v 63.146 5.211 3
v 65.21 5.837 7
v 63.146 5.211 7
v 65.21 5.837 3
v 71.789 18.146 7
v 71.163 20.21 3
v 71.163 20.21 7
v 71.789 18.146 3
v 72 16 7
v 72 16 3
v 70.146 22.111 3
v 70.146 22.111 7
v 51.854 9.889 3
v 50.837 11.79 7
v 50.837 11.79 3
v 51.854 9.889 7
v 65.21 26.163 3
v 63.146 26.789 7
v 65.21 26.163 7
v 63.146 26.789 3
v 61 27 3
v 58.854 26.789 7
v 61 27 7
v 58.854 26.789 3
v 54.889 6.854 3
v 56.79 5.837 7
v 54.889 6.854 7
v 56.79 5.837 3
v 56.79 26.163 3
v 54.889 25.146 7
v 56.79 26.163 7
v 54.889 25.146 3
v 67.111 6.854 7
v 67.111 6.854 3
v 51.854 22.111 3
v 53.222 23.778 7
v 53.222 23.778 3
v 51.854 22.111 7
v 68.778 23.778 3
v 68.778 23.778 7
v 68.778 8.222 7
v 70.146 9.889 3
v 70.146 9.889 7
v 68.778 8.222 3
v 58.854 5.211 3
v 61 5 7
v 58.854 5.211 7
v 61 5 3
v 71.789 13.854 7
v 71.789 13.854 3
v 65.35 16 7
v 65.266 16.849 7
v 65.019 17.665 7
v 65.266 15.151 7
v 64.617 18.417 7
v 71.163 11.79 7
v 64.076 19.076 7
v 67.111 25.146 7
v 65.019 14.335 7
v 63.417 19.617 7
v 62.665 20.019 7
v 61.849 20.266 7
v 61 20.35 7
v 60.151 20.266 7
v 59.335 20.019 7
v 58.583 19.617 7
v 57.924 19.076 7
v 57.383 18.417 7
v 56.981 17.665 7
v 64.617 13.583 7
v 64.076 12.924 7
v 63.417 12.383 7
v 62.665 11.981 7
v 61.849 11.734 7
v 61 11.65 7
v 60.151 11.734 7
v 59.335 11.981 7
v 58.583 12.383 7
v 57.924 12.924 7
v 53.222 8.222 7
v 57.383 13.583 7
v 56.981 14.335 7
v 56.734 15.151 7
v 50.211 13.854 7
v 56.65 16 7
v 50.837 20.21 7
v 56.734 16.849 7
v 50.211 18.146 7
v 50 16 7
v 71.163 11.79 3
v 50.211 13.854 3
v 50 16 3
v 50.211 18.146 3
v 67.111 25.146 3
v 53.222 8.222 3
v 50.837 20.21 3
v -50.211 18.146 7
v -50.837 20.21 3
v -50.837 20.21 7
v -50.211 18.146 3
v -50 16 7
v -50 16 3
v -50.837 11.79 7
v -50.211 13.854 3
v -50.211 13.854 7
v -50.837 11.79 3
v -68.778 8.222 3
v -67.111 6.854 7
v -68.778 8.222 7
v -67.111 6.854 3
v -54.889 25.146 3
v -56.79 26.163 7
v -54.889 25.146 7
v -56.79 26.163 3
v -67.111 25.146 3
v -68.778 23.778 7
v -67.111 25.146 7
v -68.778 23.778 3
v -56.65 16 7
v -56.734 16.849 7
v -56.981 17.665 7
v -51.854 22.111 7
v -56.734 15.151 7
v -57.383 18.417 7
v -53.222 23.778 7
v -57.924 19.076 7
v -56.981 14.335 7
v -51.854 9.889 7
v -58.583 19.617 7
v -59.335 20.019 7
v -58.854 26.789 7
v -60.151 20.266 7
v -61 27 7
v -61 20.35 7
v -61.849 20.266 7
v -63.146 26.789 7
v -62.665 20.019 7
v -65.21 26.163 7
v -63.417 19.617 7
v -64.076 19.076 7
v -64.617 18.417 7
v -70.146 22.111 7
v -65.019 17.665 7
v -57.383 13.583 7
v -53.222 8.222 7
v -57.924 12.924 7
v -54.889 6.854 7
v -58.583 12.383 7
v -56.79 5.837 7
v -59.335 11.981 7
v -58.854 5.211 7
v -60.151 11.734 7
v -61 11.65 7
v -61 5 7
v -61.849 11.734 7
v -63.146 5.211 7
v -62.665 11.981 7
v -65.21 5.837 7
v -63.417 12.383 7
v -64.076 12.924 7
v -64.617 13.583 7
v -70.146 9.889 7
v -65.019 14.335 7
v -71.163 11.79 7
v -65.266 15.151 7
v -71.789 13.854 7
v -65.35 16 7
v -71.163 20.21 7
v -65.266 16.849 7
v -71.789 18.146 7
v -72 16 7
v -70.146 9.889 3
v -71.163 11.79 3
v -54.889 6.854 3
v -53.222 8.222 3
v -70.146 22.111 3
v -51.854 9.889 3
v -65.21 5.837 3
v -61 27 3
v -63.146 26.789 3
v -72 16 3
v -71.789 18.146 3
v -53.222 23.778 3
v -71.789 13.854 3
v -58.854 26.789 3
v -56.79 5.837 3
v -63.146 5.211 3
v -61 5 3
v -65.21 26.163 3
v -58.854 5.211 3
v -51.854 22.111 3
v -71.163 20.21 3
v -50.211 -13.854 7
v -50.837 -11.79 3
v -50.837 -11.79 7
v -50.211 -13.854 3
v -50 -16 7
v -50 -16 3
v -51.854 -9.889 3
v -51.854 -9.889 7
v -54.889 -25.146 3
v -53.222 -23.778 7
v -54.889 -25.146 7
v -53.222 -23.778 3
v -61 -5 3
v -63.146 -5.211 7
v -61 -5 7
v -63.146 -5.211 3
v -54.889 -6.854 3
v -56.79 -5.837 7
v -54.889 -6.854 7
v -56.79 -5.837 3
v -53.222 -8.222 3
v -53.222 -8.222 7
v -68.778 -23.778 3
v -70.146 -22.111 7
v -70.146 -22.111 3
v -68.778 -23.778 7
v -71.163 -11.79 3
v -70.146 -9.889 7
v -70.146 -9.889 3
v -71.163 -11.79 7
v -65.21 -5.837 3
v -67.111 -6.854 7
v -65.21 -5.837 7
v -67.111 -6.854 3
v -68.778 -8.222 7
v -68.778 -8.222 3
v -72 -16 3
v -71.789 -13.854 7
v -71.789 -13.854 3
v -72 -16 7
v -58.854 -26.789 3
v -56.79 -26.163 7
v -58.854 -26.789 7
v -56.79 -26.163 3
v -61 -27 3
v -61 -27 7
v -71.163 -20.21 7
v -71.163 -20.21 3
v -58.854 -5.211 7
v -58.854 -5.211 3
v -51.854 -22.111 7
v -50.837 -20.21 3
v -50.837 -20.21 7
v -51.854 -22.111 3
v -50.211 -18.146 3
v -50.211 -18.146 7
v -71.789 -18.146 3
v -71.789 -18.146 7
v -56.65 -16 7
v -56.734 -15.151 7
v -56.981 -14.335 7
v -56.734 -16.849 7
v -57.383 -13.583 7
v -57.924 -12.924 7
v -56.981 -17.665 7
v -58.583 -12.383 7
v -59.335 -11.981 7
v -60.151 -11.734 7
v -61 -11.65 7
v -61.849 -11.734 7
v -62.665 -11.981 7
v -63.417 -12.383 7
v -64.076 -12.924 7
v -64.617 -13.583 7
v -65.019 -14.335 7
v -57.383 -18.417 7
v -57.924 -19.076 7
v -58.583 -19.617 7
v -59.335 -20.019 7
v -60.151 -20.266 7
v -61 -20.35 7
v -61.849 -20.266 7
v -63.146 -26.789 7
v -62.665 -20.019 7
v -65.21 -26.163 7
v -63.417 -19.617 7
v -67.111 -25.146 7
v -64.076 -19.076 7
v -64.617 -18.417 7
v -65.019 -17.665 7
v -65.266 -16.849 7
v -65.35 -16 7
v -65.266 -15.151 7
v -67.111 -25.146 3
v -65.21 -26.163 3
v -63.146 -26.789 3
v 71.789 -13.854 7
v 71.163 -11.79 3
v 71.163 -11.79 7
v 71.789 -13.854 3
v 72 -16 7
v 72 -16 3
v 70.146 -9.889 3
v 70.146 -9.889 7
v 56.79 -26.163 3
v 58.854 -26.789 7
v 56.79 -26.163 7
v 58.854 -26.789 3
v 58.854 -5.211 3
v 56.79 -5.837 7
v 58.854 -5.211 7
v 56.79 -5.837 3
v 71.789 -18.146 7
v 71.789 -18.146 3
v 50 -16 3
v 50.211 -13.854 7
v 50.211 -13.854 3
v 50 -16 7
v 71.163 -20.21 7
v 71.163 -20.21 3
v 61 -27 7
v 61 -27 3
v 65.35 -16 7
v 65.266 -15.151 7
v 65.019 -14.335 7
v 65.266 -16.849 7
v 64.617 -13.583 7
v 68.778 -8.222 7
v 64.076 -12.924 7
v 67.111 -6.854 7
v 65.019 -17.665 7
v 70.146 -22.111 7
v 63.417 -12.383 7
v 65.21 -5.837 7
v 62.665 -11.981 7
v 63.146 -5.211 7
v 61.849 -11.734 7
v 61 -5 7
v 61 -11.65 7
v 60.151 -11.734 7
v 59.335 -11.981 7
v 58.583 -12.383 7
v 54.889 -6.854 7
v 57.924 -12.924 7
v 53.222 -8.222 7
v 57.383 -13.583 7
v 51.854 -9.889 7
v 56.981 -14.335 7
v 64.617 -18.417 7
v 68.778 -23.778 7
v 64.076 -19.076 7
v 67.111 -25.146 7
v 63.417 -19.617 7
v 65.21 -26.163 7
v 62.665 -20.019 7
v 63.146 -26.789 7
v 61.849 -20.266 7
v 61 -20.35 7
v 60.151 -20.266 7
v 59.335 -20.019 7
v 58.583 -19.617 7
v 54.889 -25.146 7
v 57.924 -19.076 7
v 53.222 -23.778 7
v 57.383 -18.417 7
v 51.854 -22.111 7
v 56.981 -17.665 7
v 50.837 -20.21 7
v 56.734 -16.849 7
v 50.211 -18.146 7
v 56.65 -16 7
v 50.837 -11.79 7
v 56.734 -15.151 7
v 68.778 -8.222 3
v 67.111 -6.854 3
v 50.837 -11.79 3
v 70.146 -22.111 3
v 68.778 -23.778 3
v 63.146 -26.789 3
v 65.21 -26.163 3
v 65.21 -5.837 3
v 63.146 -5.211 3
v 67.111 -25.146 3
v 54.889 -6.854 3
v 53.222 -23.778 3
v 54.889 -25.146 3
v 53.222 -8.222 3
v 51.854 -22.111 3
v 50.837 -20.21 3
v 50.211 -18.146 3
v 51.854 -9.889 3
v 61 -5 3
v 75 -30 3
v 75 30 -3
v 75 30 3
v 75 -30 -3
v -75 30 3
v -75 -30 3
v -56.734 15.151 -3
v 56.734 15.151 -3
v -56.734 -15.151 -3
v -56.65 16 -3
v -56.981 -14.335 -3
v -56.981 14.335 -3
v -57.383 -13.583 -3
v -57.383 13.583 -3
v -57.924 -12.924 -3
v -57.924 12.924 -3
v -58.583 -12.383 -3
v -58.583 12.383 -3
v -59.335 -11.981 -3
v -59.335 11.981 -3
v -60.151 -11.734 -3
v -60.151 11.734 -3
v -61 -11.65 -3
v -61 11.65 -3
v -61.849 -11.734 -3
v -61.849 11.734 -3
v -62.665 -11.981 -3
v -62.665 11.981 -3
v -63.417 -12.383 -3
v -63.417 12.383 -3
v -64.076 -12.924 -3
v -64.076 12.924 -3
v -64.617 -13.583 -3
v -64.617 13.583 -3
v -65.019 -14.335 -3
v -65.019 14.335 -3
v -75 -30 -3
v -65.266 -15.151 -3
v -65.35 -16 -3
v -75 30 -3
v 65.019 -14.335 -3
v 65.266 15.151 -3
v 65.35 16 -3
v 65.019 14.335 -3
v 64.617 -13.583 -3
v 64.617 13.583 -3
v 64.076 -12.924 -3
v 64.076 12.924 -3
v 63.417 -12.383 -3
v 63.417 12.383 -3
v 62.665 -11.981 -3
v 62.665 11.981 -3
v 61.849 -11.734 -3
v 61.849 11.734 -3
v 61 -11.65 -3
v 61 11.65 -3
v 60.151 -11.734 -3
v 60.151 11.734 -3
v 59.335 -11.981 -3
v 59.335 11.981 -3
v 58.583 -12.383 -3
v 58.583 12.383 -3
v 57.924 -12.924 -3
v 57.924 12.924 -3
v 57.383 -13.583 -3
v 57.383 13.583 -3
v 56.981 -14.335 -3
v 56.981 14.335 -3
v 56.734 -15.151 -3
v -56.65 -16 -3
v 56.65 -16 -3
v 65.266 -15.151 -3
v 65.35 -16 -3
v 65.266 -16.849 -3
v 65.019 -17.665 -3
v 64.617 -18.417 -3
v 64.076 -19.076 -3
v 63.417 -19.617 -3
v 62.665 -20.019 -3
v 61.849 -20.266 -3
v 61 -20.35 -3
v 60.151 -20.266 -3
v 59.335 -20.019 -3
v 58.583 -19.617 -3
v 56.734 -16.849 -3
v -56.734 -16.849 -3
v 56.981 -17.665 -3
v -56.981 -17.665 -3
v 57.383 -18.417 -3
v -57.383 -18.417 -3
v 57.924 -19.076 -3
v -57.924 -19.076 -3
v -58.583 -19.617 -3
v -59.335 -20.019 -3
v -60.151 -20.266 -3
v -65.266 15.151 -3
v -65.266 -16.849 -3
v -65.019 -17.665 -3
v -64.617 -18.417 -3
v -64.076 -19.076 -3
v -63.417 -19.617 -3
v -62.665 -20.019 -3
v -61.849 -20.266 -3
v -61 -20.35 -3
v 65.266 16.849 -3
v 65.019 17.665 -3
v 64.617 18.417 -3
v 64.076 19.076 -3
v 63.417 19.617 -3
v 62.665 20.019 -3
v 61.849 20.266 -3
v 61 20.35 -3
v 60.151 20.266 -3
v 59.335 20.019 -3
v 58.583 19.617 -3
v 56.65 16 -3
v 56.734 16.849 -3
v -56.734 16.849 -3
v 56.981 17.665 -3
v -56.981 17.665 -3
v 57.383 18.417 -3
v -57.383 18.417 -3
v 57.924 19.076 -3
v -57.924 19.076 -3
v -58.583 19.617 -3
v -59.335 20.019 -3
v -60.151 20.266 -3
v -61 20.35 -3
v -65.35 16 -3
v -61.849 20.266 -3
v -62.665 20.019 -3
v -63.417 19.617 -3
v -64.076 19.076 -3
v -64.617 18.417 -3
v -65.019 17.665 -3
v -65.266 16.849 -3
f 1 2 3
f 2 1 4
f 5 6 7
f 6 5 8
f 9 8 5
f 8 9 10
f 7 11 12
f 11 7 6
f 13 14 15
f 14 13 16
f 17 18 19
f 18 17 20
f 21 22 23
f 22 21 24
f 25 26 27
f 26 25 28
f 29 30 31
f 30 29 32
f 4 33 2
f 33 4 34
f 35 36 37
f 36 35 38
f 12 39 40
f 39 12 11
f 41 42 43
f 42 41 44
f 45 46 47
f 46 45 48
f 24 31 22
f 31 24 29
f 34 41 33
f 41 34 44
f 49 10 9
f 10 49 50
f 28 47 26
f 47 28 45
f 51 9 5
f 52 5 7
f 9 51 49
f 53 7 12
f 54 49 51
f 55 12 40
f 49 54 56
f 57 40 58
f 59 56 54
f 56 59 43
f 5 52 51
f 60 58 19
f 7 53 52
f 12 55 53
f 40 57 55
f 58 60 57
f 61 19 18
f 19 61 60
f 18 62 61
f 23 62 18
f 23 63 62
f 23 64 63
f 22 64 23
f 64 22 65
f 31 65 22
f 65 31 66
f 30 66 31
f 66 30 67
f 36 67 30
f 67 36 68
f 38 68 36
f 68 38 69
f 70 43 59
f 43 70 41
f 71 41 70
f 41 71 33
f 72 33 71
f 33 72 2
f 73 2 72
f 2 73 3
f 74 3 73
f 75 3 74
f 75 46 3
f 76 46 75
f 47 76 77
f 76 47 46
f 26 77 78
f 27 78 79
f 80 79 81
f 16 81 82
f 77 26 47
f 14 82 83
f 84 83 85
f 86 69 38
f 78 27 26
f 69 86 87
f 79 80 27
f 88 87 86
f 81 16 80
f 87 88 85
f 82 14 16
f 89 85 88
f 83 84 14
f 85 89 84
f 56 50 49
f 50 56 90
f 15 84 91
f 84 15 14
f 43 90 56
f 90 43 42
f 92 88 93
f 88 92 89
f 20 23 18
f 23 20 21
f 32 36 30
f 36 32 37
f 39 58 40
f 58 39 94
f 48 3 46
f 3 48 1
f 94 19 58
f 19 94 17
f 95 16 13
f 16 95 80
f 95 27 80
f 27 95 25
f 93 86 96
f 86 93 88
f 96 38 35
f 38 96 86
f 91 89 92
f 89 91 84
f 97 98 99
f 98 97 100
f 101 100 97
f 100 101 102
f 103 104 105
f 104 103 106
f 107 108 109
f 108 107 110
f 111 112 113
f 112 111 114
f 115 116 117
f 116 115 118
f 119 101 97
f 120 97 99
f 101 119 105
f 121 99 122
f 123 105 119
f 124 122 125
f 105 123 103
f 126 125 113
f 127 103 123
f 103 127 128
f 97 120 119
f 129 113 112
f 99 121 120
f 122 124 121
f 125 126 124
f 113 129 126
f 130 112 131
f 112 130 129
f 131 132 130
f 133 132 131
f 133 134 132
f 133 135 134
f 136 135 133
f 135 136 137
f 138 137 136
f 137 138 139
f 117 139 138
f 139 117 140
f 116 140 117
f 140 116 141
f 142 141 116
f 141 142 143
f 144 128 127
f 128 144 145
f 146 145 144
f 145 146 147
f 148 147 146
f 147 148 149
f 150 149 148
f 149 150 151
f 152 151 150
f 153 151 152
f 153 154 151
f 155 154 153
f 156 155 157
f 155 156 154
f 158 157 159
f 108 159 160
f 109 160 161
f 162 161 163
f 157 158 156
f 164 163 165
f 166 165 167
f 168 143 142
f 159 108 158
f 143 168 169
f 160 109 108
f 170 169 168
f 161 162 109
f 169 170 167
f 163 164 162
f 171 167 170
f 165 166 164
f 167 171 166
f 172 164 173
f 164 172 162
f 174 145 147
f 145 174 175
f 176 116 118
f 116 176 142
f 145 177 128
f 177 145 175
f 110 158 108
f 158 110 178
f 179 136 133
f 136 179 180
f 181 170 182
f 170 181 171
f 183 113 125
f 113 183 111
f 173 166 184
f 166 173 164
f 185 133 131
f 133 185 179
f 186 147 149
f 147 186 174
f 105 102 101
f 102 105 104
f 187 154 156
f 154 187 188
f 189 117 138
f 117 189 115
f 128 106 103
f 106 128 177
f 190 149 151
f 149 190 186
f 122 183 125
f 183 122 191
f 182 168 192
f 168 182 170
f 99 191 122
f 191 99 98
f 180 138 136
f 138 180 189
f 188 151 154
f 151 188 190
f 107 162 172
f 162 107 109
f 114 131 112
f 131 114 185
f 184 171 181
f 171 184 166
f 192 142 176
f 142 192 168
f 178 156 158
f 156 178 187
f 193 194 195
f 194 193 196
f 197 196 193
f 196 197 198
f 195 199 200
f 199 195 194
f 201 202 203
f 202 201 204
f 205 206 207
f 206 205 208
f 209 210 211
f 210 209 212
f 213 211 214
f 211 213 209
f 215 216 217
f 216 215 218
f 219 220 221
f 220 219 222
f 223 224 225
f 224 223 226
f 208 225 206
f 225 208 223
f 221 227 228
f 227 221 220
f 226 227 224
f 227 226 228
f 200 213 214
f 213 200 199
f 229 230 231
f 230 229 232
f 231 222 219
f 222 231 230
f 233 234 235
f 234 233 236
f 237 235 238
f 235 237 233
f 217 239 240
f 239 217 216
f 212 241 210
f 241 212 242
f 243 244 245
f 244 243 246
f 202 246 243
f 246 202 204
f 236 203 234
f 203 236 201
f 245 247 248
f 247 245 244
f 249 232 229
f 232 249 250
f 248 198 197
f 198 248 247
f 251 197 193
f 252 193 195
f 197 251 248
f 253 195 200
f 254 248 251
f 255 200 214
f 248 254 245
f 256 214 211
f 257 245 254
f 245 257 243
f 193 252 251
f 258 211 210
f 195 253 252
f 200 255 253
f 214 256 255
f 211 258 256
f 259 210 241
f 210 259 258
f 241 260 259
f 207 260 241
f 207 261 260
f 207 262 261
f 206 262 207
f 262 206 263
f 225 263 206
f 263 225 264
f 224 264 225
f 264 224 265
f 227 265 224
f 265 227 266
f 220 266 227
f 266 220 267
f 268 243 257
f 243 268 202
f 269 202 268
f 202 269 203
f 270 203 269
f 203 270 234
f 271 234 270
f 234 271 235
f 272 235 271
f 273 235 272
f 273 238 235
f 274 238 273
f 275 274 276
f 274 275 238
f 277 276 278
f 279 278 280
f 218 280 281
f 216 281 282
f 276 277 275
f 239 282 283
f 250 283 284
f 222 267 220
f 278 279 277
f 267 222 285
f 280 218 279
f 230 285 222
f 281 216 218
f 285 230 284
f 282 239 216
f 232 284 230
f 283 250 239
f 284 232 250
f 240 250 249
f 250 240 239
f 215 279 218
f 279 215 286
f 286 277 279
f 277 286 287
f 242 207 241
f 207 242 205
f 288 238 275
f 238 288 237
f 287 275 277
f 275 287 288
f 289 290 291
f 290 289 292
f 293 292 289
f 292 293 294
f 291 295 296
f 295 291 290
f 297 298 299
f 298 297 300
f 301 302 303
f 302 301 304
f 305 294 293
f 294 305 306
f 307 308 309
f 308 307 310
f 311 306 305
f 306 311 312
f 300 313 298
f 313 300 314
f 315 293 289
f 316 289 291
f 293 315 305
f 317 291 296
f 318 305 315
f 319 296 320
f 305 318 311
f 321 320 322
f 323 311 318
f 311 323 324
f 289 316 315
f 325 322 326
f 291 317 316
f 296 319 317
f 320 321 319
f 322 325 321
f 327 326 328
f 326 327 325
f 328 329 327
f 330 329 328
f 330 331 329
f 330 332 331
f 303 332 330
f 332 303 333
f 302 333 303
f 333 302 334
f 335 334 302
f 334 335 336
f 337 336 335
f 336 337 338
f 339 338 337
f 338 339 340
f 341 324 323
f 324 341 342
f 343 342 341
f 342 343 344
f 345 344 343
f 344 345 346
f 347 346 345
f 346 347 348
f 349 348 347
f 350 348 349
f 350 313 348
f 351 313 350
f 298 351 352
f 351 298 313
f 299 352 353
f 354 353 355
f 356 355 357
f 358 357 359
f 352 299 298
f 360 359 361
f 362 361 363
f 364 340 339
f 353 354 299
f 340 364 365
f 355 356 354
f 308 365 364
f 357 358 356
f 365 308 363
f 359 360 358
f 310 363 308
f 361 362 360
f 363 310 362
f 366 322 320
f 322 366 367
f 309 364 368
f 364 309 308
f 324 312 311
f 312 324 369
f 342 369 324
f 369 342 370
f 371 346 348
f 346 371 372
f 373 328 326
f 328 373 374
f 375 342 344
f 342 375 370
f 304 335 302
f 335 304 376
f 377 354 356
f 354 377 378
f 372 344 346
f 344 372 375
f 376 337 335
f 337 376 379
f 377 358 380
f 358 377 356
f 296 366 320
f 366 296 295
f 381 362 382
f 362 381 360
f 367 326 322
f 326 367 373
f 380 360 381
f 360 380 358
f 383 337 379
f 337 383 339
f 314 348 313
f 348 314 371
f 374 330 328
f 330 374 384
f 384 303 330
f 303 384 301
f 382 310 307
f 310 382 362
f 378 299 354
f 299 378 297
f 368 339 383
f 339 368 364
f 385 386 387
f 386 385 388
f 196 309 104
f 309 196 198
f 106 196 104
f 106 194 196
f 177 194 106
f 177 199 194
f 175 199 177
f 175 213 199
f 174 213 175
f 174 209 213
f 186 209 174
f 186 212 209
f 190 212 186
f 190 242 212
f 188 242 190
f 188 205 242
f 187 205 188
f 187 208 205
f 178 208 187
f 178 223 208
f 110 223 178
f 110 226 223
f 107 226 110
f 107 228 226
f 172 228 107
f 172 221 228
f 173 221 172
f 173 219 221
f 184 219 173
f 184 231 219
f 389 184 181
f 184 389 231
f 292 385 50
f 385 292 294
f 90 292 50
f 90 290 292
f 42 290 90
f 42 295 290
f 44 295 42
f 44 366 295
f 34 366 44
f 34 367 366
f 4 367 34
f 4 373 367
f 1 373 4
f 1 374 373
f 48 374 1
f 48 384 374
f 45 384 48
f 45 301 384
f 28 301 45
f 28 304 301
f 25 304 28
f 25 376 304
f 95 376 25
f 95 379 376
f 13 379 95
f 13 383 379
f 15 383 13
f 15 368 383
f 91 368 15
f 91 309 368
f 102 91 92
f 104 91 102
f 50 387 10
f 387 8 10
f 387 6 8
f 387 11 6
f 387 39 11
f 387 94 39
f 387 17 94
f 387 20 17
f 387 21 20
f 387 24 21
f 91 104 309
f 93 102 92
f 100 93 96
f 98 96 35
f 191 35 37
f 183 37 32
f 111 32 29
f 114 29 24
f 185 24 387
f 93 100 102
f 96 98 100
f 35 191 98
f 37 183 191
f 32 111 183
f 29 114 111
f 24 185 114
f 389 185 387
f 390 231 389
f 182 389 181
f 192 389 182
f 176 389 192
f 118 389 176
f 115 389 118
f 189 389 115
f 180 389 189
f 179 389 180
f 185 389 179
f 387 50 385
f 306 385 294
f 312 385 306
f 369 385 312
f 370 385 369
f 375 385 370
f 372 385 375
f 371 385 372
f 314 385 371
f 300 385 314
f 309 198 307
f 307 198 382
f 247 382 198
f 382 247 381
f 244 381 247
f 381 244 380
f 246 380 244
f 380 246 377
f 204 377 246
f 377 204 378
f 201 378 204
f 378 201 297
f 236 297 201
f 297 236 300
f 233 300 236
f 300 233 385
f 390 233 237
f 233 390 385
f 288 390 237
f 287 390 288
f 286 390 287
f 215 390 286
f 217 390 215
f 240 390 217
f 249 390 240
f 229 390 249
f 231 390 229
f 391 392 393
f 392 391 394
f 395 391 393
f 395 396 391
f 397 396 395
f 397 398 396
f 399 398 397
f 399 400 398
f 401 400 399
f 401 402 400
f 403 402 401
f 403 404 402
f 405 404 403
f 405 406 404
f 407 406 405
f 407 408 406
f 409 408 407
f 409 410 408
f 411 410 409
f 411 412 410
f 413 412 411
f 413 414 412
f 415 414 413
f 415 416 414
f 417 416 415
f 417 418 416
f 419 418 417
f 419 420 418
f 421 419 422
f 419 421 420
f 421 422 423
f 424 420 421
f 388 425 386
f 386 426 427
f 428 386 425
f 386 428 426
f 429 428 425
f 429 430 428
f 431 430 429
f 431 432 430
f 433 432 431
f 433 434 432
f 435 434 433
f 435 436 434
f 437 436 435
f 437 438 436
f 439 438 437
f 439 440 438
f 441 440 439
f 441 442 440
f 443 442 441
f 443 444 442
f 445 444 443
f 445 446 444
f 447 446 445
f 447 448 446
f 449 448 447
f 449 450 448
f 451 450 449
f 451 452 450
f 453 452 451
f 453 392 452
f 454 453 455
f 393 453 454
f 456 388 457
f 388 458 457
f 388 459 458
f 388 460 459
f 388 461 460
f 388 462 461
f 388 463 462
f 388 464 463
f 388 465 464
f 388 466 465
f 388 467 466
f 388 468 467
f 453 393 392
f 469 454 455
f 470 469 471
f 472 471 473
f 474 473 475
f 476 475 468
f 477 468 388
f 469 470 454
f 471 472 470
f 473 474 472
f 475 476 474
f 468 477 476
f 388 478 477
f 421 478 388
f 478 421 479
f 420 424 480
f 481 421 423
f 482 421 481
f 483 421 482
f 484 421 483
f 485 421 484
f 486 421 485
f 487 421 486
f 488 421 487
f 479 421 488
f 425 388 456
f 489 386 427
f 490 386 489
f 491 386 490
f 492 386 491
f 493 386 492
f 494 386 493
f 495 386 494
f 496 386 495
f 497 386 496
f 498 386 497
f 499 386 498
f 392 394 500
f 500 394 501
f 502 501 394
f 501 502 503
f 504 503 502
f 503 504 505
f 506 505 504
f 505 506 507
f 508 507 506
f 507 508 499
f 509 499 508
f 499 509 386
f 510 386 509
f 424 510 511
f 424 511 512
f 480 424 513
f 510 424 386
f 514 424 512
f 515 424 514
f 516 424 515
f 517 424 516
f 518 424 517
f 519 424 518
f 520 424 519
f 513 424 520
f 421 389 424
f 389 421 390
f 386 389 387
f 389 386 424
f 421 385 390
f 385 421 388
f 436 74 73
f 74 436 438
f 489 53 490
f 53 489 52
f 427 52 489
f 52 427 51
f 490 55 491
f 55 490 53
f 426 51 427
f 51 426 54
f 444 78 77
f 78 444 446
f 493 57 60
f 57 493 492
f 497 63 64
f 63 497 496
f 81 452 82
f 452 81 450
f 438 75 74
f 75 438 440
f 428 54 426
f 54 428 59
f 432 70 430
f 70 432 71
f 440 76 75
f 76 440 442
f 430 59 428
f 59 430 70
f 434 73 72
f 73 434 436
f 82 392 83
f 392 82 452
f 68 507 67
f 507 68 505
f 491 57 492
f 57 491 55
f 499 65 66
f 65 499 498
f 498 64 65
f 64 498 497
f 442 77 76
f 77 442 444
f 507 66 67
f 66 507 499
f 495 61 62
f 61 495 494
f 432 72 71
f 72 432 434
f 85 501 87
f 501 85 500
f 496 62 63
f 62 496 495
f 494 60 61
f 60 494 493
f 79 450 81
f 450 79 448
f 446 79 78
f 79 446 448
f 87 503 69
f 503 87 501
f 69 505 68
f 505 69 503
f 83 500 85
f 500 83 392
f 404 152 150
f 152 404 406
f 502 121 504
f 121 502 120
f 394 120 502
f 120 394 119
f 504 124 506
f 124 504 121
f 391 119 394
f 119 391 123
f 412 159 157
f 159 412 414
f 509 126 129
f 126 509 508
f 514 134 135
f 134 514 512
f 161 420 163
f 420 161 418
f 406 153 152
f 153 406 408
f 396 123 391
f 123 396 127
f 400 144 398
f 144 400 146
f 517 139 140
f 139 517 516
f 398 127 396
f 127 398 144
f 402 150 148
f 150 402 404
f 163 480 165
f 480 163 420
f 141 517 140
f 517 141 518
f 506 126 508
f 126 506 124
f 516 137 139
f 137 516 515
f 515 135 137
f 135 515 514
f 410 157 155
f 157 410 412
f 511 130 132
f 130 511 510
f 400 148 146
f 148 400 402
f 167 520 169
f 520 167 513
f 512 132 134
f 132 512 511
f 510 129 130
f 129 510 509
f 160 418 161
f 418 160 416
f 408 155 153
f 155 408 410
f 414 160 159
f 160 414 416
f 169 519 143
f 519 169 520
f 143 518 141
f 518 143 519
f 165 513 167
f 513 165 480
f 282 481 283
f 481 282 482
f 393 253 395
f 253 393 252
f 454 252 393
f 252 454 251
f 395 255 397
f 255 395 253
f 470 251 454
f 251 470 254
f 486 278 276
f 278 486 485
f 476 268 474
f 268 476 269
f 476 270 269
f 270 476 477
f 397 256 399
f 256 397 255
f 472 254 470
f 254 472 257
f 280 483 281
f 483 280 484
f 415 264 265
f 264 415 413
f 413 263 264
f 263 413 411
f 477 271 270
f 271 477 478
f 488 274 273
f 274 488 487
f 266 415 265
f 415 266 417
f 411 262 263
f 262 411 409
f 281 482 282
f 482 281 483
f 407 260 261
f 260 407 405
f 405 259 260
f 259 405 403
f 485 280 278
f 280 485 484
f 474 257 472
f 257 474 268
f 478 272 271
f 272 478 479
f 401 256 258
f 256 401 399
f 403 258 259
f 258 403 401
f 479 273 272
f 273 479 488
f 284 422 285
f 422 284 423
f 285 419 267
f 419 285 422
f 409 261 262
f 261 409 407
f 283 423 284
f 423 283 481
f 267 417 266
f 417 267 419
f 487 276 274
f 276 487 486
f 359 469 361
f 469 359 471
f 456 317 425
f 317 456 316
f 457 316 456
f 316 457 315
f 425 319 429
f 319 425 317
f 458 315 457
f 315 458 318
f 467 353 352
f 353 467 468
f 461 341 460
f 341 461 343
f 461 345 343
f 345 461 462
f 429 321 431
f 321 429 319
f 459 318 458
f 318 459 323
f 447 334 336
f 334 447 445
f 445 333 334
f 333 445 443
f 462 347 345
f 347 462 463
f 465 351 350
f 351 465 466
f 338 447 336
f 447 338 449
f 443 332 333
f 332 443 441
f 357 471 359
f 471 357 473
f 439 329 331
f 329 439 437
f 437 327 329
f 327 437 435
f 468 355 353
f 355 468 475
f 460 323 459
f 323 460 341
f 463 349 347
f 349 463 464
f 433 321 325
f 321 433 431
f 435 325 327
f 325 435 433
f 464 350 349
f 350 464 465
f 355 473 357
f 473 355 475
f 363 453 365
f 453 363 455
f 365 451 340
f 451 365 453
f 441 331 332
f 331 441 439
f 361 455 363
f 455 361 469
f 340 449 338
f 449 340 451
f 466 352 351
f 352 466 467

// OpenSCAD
$fn = 32;

// ----------------------------------------------------------------------
// Anchor pads 150 x 60 x 10
// four corner bosses with anchor holes
// ----------------------------------------------------------------------

// --- parameters (mm) ---
plate = [150, 60, 6];   // base plate size (x, y, z)
pads = 4;               // boss count, one per corner
edge = 14;              // boss centre offset from the plate edge
boss_d = 22;            // boss diameter
boss_h = 4;             // boss height above the base plate
bore_d = 8.4;           // nominal hole diameter from the drawing
print_allowance = 0.3;  // clearance added for printing

// --- derived feature positions (mm) ---
hole_d = bore_d + print_allowance;  // = 8.7   hole diameter as printed
height = plate[2] + boss_h;         // = 10   overall height of the part
corner_x = plate[0] / 2 - edge;     // = 61   boss centre X
corner_y = plate[1] / 2 - edge;     // = 16   boss centre Y
feature_centers = [
  [corner_x, corner_y],
  [-corner_x, corner_y],
  [-corner_x, -corner_y],
  [corner_x, -corner_y]
];   // boss centres, anchor holes are drilled there

// base plate, four bosses standing on it, anchor holes all the way through
difference() {
  union() {
    cube(plate, center = true);
    for (centre = feature_centers)
      translate([centre[0], centre[1], plate[2] / 2 - 1])
        cylinder(d = boss_d, h = boss_h + 1);
  }
  for (centre = feature_centers)
    translate([centre[0], centre[1], -height])
      cylinder(d = hole_d, h = 2 * height + 2);  // through boss and plate
}
